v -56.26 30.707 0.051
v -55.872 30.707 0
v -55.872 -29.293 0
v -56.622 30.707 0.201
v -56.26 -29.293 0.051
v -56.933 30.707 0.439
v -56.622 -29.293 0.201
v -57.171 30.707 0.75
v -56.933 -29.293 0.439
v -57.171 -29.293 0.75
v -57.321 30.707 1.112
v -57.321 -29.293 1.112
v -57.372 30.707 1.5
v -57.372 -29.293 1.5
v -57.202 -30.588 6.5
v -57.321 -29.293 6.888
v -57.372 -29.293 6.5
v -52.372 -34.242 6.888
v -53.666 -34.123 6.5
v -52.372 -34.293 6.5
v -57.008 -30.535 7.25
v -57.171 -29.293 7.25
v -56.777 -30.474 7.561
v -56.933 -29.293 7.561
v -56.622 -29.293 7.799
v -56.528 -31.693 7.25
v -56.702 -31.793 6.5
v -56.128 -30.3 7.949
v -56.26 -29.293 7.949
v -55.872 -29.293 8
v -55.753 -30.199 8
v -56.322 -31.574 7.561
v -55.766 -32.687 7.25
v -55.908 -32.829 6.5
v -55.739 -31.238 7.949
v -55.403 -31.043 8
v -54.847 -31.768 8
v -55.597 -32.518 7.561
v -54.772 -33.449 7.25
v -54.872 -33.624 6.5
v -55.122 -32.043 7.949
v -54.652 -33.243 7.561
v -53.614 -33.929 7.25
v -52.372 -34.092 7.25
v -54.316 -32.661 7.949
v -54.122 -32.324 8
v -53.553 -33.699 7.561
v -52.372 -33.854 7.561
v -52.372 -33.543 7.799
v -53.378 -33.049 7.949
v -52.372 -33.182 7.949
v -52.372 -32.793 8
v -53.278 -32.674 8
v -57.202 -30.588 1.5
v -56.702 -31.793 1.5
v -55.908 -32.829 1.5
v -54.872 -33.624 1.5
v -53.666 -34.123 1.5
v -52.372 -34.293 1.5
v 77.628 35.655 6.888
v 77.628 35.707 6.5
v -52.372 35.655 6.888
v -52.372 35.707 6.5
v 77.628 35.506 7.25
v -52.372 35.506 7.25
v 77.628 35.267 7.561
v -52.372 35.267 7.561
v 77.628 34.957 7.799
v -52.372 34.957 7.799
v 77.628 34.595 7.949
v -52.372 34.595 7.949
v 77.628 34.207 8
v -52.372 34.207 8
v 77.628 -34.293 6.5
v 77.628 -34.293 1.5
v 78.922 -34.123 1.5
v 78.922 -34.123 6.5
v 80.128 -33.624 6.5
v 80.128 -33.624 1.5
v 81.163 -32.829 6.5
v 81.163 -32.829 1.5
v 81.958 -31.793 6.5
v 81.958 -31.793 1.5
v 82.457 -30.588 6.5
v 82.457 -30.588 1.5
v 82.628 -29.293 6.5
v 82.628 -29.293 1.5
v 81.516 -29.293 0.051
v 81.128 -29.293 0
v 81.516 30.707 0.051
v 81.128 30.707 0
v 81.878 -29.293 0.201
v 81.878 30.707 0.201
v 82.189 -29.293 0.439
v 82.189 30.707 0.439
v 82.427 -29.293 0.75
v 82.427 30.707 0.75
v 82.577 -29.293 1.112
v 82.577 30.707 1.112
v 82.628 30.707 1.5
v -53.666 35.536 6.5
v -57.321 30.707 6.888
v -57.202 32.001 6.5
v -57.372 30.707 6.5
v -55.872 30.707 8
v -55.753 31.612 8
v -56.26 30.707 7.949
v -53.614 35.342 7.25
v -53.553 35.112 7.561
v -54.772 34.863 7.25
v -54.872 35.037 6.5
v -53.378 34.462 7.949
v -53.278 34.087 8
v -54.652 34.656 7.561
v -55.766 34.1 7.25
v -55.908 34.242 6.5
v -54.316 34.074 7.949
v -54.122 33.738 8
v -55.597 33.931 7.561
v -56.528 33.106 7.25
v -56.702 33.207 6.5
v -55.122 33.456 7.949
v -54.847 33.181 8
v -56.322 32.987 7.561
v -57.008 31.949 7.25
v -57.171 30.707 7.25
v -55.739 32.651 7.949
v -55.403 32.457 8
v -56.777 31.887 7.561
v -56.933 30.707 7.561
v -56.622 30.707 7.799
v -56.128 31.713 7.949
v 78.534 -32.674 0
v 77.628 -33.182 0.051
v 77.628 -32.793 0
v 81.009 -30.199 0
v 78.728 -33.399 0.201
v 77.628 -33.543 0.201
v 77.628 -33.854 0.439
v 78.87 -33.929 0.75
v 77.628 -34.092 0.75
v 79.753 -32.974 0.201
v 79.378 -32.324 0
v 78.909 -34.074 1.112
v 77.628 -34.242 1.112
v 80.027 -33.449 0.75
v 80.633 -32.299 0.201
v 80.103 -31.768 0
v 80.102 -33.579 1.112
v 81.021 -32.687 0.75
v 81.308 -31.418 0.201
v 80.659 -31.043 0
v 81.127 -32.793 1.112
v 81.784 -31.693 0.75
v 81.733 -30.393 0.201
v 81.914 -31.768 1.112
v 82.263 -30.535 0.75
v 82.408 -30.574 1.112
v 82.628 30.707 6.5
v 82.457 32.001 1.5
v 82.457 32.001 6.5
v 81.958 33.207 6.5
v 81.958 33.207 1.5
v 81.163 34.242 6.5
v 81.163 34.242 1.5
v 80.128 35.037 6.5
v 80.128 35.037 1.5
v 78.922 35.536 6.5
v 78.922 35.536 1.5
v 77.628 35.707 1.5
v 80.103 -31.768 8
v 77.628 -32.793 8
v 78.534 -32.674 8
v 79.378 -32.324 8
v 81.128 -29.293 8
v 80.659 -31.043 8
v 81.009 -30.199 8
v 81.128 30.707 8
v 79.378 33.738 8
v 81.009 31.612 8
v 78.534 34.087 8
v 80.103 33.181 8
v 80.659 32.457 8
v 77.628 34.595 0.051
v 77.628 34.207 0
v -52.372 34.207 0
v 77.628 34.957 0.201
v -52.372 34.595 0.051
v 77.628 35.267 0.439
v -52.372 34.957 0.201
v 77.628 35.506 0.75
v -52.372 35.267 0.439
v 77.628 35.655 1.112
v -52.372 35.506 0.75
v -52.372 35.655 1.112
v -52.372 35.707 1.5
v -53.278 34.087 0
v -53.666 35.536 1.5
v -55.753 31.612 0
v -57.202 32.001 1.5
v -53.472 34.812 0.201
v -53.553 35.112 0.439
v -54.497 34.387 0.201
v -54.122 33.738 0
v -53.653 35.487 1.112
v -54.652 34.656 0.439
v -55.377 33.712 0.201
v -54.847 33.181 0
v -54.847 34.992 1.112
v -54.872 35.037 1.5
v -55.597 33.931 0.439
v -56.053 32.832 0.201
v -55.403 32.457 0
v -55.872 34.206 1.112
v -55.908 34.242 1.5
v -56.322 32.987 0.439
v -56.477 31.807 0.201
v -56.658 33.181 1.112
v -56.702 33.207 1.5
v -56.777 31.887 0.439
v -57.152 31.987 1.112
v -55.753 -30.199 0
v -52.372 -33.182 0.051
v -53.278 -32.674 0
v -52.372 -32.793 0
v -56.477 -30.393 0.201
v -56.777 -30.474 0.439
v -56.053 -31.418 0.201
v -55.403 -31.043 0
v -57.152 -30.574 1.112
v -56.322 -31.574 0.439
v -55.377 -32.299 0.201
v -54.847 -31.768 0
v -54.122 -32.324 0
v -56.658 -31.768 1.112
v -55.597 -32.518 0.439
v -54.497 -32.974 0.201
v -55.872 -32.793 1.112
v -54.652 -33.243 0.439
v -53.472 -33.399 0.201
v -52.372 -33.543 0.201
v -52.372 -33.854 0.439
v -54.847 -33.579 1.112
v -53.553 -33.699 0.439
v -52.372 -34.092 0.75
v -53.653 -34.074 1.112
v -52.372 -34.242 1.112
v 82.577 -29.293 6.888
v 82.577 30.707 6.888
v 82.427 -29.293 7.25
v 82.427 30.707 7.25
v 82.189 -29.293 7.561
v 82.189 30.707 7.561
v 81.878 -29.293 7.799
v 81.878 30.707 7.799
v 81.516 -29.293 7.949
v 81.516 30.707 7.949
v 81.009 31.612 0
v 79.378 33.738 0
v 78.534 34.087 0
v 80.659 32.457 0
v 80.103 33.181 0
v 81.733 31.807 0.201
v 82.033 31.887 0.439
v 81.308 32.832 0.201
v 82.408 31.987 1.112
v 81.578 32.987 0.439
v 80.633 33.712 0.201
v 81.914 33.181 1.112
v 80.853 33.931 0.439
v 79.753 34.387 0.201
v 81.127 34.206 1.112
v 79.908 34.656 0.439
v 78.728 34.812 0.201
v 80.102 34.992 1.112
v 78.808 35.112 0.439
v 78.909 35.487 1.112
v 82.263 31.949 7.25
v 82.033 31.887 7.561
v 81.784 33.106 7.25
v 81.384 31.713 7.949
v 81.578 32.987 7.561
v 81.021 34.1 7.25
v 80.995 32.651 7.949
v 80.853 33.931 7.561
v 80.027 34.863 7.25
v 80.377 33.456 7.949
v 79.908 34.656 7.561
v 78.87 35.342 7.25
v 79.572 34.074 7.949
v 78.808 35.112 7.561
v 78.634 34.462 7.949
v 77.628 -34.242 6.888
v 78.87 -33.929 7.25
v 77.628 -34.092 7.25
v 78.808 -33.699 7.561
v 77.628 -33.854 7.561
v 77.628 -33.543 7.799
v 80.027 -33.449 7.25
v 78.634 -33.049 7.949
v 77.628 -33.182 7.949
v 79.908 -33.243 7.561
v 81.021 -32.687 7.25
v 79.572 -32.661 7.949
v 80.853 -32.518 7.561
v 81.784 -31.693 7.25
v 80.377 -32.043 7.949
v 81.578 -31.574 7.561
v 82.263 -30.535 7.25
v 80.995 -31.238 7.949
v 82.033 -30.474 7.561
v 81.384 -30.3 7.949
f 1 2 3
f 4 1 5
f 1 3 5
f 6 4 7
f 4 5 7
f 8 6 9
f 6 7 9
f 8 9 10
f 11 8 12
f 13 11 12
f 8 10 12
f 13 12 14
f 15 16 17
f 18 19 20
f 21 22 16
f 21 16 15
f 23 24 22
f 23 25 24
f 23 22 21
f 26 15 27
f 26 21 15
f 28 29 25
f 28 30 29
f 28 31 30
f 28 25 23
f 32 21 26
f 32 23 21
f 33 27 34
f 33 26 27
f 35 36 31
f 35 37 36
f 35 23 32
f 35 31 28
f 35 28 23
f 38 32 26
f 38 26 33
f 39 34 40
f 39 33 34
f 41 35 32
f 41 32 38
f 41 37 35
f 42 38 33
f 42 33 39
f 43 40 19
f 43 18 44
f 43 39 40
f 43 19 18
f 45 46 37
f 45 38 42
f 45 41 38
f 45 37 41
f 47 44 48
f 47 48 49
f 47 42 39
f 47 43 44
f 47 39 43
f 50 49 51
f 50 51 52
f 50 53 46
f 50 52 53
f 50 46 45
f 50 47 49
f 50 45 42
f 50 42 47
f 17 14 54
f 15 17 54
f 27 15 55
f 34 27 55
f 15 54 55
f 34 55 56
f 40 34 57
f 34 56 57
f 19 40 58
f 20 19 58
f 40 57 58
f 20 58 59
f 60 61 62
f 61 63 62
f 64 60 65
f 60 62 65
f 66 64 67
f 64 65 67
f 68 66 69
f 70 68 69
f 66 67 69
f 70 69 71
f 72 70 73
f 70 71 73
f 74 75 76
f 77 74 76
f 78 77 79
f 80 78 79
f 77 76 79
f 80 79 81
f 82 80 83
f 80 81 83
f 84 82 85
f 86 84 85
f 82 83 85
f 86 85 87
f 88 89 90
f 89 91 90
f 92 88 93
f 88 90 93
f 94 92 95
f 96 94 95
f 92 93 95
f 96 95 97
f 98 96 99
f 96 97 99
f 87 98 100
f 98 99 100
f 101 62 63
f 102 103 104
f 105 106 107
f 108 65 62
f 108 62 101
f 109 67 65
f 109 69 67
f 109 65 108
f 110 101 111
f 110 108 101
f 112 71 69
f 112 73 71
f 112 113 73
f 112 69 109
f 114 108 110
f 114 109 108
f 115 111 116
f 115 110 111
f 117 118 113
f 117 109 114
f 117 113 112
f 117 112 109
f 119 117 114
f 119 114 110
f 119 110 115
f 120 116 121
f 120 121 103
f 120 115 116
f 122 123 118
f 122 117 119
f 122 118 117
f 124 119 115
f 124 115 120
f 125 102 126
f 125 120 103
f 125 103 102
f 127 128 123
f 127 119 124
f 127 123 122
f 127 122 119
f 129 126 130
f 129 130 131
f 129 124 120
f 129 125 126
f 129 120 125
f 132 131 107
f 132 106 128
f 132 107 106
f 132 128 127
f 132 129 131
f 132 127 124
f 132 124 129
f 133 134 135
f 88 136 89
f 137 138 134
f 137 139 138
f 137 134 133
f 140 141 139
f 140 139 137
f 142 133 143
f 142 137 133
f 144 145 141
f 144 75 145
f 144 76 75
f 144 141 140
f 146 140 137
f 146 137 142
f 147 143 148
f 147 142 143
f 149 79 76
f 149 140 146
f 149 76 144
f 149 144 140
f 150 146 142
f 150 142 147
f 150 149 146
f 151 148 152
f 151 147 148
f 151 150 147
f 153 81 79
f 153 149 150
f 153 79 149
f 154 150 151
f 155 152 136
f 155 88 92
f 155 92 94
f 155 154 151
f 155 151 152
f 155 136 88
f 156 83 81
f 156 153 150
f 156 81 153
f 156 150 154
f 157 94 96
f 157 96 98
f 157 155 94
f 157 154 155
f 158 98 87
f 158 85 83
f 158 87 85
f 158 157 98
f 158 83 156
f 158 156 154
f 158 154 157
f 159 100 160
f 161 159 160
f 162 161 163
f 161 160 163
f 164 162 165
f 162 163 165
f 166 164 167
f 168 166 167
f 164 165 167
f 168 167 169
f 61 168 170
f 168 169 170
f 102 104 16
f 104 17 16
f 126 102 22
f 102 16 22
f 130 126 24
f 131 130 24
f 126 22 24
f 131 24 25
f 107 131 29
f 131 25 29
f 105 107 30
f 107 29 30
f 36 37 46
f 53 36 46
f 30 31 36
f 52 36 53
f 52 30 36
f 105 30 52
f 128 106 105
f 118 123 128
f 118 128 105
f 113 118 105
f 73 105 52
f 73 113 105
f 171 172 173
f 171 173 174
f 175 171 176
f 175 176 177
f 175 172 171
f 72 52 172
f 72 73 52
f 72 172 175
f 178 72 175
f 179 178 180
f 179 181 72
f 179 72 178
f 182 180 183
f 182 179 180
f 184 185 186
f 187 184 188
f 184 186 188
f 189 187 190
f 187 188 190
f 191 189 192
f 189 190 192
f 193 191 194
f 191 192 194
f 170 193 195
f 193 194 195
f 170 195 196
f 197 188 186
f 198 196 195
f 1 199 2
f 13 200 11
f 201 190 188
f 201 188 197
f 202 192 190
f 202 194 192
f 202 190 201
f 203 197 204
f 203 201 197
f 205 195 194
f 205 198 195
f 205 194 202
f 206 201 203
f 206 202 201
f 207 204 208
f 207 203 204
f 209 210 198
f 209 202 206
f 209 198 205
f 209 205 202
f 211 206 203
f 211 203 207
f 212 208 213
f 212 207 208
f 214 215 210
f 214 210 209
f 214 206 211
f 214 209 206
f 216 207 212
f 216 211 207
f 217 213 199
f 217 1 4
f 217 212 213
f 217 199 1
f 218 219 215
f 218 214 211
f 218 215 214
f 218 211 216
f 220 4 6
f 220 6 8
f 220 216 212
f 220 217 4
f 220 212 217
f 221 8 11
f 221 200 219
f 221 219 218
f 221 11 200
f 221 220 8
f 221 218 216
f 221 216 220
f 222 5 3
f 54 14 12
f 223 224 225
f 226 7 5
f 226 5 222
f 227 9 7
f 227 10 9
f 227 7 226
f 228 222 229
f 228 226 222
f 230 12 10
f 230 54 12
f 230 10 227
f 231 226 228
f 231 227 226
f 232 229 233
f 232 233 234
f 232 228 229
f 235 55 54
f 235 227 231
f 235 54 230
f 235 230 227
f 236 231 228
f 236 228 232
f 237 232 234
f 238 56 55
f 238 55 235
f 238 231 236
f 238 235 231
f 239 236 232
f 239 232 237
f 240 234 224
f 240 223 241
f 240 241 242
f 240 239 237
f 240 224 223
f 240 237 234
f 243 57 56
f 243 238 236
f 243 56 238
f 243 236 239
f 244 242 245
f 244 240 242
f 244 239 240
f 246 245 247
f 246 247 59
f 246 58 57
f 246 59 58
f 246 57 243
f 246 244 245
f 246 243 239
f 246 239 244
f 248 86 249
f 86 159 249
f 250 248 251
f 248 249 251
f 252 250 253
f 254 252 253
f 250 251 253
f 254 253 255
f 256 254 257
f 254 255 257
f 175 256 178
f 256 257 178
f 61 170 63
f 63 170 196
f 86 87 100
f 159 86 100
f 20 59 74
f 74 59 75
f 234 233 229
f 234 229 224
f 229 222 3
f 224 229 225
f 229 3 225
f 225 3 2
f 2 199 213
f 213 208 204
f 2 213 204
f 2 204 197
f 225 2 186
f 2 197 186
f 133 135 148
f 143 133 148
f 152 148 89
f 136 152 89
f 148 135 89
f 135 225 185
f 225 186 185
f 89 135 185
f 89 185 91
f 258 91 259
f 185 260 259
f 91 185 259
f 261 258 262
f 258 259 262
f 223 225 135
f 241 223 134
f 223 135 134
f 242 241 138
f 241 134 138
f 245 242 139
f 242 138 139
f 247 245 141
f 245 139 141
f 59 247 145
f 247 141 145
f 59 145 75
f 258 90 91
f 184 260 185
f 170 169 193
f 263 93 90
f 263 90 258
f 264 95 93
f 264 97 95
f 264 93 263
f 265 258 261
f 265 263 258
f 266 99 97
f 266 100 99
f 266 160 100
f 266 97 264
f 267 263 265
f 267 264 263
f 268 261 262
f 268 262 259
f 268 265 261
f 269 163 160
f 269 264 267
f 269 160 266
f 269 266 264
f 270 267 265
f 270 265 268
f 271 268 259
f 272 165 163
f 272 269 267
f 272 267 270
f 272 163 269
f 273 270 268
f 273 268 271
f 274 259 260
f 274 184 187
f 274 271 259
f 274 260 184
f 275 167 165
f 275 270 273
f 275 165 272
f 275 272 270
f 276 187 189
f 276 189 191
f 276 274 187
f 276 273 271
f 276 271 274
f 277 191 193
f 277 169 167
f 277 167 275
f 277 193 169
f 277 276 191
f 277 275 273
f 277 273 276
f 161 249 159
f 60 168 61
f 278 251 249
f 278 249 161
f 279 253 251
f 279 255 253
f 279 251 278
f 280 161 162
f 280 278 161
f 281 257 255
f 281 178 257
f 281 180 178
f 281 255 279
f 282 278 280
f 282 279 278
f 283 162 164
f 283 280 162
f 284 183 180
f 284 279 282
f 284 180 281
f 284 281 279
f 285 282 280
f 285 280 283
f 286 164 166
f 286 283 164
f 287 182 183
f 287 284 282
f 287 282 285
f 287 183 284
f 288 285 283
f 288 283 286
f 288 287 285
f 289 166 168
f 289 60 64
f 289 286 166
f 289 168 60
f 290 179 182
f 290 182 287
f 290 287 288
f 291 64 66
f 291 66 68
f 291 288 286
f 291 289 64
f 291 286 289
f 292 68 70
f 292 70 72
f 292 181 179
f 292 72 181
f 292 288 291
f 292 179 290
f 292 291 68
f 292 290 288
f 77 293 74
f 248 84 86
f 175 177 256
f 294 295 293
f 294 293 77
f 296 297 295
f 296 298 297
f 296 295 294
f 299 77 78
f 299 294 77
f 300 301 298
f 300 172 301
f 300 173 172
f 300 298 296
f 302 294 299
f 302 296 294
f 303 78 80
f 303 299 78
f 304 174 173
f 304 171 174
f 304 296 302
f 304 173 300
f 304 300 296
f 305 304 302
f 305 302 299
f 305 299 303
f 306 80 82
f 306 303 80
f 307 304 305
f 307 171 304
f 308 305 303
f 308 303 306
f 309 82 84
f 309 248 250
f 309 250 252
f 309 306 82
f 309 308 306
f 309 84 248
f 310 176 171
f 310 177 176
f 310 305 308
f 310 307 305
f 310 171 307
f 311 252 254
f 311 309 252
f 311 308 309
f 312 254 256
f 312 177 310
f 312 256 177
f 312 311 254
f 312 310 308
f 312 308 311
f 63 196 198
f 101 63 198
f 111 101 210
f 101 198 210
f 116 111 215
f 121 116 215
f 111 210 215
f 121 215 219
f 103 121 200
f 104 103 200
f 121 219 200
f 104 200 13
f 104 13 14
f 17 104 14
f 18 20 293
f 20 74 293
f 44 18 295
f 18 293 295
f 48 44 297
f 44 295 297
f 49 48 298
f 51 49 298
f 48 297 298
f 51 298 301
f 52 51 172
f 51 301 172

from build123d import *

# Parameters (mm, degrees)
F1_DEPTH = 8
F3_R     = 1.5
F4_R     = 1.5


with BuildPart() as f1:
    # F0 (on Top) → F1 (new body)
    with BuildSketch(Plane.XY):
        with BuildLine():
            Line((77.627857, 35.706591), (-52.372143, 35.706591))
            ThreePointArc((-52.372143, 35.706591), (-55.907677, 34.242125), (-57.372143, 30.706591))
            Line((-57.372143, 30.706591), (-57.372143, -29.293409))
            ThreePointArc((-57.372143, -29.293409), (-55.907677, -32.828943), (-52.372143, -34.293409))
            Line((-52.372143, -34.293409), (77.627857, -34.293409))
            ThreePointArc((77.627857, -34.293409), (81.163391, -32.828943), (82.627857, -29.293409))
            Line((82.627857, -29.293409), (82.627857, 30.706591))
            ThreePointArc((82.627857, 30.706591), (81.163391, 34.242125), (77.627857, 35.706591))
        make_face()
    extrude(amount=F1_DEPTH)

    # F3
    f3_edges = [f1.edges().sort_by_distance(p)[0] for p in [
        (82.627857, 0.706591, 8),
        (81.163391, 34.242125, 8),
        (12.627857, 35.706591, 8),
        (-55.907677, 34.242125, 8),
        (-57.372143, 0.706591, 8),
        (-55.907677, -32.828943, 8),
        (12.627857, -34.293409, 8),
        (81.163391, -32.828943, 8),
    ]]
    fillet(f3_edges, radius=F3_R)

    # F4
    f4_edges = [f1.edges().sort_by_distance(p)[0] for p in [
        (82.627857, 0.706591, 0),
        (81.163391, 34.242125, 0),
        (12.627857, 35.706591, 0),
        (-55.907677, 34.242125, 0),
        (-57.372143, 0.706591, 0),
        (-55.907677, -32.828943, 0),
        (12.627857, -34.293409, 0),
        (81.163391, -32.828943, 0),
    ]]
    fillet(f4_edges, radius=F4_R)


solid = f1.part
